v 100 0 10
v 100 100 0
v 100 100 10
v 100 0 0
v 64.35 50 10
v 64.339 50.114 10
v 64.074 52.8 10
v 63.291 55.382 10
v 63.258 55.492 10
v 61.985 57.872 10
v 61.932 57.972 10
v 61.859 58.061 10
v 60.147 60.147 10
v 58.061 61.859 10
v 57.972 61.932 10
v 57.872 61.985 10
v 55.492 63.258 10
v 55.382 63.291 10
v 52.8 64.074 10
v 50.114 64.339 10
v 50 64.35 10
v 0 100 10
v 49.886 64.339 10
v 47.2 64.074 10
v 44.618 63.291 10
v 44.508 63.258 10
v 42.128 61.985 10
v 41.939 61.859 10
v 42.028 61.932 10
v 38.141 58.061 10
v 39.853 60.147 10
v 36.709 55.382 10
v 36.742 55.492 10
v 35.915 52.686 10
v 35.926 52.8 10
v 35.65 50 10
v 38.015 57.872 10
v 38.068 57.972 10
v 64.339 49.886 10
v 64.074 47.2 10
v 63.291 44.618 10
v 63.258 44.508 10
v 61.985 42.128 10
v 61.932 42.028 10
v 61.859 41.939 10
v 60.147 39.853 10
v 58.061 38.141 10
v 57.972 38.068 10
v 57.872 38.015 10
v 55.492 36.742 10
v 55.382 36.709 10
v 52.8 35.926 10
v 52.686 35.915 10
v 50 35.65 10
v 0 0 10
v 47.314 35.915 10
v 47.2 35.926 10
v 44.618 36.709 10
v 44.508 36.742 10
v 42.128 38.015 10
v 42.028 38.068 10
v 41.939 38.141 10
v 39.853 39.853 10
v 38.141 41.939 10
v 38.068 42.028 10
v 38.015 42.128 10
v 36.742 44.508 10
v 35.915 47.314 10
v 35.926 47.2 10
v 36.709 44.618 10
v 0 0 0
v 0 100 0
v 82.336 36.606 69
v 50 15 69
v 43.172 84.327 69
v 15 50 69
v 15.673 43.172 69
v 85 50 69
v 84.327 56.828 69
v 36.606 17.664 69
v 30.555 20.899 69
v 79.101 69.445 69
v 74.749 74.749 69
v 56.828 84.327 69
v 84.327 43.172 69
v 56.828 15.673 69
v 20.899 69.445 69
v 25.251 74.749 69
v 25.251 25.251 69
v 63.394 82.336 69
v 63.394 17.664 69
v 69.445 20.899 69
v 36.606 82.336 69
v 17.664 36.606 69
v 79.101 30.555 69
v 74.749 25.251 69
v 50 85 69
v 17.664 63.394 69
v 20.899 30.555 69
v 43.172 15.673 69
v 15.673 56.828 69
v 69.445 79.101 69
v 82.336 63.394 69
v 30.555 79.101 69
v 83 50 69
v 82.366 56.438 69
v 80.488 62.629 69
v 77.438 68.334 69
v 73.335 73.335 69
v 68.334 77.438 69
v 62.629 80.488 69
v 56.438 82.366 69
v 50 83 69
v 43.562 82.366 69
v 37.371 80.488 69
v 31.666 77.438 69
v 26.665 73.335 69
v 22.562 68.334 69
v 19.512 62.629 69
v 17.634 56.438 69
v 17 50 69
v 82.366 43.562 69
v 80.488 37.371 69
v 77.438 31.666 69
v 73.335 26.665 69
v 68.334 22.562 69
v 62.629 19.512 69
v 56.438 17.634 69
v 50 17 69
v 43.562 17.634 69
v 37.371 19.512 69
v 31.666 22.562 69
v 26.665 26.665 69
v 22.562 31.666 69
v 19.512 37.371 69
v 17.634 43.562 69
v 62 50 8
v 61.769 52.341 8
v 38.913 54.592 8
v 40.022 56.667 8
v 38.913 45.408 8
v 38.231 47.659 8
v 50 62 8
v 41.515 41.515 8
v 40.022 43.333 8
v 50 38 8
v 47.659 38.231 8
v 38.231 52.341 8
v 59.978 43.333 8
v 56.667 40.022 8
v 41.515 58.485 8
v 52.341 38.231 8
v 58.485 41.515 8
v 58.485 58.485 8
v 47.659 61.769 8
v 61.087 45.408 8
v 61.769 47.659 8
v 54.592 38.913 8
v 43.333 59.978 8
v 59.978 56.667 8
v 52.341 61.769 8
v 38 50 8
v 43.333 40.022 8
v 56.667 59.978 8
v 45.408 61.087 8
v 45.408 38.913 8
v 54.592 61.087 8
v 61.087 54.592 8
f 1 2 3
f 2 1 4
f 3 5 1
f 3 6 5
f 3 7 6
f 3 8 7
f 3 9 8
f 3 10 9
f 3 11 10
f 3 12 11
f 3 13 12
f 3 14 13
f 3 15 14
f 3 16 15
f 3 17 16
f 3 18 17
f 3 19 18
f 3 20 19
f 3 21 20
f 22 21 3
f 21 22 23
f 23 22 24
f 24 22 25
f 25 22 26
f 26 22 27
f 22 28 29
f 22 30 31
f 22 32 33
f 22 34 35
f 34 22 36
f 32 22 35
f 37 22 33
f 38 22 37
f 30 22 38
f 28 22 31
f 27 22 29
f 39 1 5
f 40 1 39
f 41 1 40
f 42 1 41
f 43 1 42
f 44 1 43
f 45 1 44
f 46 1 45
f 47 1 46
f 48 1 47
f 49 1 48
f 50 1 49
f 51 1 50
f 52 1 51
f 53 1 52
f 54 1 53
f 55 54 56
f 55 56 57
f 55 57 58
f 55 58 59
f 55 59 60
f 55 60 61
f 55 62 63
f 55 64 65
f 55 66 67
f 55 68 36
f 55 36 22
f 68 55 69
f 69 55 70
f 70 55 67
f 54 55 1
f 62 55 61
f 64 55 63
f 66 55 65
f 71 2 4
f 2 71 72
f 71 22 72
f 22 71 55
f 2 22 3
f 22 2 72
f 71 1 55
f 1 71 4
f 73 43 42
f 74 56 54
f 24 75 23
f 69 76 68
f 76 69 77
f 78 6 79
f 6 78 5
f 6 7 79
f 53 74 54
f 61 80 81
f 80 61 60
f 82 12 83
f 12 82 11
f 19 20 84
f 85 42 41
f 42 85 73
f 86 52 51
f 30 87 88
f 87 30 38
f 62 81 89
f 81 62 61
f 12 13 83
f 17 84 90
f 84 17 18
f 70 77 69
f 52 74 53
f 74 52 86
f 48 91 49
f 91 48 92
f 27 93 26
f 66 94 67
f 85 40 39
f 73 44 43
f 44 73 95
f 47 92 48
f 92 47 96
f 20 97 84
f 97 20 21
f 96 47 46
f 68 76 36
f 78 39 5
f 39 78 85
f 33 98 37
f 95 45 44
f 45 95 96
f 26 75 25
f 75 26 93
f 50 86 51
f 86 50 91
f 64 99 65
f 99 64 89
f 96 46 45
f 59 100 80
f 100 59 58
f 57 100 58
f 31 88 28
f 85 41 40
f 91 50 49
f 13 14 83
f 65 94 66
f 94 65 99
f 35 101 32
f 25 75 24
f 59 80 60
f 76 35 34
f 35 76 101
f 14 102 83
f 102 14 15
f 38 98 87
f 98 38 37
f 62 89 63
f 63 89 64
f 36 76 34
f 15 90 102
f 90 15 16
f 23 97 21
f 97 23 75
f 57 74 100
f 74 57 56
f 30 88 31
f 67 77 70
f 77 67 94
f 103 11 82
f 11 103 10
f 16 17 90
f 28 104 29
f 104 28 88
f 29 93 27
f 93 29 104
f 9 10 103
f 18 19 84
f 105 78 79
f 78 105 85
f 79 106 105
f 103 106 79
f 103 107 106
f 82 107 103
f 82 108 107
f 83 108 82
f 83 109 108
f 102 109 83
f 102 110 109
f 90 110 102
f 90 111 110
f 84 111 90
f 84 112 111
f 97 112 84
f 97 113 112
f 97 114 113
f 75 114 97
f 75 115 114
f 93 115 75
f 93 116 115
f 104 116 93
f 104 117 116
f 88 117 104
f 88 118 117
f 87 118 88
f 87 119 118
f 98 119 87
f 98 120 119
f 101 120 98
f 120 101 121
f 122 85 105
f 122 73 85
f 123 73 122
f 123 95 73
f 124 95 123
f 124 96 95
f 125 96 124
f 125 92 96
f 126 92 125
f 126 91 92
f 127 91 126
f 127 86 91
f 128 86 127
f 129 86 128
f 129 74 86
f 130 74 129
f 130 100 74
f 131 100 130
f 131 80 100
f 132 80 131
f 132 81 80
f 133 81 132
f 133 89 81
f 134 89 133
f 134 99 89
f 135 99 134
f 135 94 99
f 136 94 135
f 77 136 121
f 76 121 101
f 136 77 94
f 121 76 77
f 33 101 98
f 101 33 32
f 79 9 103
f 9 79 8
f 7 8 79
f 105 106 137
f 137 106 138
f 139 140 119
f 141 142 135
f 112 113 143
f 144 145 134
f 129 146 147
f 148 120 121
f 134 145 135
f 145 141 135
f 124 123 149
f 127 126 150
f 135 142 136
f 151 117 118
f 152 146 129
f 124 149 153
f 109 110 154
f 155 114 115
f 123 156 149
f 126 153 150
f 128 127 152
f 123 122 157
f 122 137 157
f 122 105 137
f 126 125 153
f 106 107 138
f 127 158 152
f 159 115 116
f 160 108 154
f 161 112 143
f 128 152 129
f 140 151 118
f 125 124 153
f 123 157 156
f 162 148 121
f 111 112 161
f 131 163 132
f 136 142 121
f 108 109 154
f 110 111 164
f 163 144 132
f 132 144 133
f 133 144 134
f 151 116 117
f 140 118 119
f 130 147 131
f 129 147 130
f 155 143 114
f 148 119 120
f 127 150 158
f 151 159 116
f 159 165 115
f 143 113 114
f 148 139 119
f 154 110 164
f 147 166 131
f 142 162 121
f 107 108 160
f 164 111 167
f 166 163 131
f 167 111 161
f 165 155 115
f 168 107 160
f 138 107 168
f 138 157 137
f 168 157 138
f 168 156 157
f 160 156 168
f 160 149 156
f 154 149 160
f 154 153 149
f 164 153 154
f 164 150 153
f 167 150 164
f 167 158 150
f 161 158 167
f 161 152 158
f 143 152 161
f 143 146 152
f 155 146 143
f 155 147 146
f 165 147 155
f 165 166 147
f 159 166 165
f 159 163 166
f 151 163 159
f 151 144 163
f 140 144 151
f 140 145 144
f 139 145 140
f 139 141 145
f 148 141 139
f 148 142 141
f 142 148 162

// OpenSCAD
$fn = 32;

// ----------------------------------------------------------------------
// Hopper: funnel with square flange
// ----------------------------------------------------------------------

// --- parameters (mm) ---
fl = 100;                 // flange side, X and Y
fl_t = 10;                // flange thickness
cone_h = 60;              // cone height above the flange
top_d = 70;               // cone mouth diameter
bot_d = 28;               // cone spout diameter
wall = 2;                 // cone wall thickness

bore_d = bot_d - 2 * wall;  // spout bore diameter
total_h = fl_t + cone_h - 1;  // overall height

difference() {
  union() {
    cube([fl, fl, fl_t]);
    translate([fl / 2, fl / 2, fl_t - 1])
      cylinder(h = cone_h, d1 = bot_d, d2 = top_d);
  }
  translate([fl / 2, fl / 2, fl_t - 2])
    cylinder(h = cone_h + 1, d1 = bore_d, d2 = top_d - 2 * wall);
}
